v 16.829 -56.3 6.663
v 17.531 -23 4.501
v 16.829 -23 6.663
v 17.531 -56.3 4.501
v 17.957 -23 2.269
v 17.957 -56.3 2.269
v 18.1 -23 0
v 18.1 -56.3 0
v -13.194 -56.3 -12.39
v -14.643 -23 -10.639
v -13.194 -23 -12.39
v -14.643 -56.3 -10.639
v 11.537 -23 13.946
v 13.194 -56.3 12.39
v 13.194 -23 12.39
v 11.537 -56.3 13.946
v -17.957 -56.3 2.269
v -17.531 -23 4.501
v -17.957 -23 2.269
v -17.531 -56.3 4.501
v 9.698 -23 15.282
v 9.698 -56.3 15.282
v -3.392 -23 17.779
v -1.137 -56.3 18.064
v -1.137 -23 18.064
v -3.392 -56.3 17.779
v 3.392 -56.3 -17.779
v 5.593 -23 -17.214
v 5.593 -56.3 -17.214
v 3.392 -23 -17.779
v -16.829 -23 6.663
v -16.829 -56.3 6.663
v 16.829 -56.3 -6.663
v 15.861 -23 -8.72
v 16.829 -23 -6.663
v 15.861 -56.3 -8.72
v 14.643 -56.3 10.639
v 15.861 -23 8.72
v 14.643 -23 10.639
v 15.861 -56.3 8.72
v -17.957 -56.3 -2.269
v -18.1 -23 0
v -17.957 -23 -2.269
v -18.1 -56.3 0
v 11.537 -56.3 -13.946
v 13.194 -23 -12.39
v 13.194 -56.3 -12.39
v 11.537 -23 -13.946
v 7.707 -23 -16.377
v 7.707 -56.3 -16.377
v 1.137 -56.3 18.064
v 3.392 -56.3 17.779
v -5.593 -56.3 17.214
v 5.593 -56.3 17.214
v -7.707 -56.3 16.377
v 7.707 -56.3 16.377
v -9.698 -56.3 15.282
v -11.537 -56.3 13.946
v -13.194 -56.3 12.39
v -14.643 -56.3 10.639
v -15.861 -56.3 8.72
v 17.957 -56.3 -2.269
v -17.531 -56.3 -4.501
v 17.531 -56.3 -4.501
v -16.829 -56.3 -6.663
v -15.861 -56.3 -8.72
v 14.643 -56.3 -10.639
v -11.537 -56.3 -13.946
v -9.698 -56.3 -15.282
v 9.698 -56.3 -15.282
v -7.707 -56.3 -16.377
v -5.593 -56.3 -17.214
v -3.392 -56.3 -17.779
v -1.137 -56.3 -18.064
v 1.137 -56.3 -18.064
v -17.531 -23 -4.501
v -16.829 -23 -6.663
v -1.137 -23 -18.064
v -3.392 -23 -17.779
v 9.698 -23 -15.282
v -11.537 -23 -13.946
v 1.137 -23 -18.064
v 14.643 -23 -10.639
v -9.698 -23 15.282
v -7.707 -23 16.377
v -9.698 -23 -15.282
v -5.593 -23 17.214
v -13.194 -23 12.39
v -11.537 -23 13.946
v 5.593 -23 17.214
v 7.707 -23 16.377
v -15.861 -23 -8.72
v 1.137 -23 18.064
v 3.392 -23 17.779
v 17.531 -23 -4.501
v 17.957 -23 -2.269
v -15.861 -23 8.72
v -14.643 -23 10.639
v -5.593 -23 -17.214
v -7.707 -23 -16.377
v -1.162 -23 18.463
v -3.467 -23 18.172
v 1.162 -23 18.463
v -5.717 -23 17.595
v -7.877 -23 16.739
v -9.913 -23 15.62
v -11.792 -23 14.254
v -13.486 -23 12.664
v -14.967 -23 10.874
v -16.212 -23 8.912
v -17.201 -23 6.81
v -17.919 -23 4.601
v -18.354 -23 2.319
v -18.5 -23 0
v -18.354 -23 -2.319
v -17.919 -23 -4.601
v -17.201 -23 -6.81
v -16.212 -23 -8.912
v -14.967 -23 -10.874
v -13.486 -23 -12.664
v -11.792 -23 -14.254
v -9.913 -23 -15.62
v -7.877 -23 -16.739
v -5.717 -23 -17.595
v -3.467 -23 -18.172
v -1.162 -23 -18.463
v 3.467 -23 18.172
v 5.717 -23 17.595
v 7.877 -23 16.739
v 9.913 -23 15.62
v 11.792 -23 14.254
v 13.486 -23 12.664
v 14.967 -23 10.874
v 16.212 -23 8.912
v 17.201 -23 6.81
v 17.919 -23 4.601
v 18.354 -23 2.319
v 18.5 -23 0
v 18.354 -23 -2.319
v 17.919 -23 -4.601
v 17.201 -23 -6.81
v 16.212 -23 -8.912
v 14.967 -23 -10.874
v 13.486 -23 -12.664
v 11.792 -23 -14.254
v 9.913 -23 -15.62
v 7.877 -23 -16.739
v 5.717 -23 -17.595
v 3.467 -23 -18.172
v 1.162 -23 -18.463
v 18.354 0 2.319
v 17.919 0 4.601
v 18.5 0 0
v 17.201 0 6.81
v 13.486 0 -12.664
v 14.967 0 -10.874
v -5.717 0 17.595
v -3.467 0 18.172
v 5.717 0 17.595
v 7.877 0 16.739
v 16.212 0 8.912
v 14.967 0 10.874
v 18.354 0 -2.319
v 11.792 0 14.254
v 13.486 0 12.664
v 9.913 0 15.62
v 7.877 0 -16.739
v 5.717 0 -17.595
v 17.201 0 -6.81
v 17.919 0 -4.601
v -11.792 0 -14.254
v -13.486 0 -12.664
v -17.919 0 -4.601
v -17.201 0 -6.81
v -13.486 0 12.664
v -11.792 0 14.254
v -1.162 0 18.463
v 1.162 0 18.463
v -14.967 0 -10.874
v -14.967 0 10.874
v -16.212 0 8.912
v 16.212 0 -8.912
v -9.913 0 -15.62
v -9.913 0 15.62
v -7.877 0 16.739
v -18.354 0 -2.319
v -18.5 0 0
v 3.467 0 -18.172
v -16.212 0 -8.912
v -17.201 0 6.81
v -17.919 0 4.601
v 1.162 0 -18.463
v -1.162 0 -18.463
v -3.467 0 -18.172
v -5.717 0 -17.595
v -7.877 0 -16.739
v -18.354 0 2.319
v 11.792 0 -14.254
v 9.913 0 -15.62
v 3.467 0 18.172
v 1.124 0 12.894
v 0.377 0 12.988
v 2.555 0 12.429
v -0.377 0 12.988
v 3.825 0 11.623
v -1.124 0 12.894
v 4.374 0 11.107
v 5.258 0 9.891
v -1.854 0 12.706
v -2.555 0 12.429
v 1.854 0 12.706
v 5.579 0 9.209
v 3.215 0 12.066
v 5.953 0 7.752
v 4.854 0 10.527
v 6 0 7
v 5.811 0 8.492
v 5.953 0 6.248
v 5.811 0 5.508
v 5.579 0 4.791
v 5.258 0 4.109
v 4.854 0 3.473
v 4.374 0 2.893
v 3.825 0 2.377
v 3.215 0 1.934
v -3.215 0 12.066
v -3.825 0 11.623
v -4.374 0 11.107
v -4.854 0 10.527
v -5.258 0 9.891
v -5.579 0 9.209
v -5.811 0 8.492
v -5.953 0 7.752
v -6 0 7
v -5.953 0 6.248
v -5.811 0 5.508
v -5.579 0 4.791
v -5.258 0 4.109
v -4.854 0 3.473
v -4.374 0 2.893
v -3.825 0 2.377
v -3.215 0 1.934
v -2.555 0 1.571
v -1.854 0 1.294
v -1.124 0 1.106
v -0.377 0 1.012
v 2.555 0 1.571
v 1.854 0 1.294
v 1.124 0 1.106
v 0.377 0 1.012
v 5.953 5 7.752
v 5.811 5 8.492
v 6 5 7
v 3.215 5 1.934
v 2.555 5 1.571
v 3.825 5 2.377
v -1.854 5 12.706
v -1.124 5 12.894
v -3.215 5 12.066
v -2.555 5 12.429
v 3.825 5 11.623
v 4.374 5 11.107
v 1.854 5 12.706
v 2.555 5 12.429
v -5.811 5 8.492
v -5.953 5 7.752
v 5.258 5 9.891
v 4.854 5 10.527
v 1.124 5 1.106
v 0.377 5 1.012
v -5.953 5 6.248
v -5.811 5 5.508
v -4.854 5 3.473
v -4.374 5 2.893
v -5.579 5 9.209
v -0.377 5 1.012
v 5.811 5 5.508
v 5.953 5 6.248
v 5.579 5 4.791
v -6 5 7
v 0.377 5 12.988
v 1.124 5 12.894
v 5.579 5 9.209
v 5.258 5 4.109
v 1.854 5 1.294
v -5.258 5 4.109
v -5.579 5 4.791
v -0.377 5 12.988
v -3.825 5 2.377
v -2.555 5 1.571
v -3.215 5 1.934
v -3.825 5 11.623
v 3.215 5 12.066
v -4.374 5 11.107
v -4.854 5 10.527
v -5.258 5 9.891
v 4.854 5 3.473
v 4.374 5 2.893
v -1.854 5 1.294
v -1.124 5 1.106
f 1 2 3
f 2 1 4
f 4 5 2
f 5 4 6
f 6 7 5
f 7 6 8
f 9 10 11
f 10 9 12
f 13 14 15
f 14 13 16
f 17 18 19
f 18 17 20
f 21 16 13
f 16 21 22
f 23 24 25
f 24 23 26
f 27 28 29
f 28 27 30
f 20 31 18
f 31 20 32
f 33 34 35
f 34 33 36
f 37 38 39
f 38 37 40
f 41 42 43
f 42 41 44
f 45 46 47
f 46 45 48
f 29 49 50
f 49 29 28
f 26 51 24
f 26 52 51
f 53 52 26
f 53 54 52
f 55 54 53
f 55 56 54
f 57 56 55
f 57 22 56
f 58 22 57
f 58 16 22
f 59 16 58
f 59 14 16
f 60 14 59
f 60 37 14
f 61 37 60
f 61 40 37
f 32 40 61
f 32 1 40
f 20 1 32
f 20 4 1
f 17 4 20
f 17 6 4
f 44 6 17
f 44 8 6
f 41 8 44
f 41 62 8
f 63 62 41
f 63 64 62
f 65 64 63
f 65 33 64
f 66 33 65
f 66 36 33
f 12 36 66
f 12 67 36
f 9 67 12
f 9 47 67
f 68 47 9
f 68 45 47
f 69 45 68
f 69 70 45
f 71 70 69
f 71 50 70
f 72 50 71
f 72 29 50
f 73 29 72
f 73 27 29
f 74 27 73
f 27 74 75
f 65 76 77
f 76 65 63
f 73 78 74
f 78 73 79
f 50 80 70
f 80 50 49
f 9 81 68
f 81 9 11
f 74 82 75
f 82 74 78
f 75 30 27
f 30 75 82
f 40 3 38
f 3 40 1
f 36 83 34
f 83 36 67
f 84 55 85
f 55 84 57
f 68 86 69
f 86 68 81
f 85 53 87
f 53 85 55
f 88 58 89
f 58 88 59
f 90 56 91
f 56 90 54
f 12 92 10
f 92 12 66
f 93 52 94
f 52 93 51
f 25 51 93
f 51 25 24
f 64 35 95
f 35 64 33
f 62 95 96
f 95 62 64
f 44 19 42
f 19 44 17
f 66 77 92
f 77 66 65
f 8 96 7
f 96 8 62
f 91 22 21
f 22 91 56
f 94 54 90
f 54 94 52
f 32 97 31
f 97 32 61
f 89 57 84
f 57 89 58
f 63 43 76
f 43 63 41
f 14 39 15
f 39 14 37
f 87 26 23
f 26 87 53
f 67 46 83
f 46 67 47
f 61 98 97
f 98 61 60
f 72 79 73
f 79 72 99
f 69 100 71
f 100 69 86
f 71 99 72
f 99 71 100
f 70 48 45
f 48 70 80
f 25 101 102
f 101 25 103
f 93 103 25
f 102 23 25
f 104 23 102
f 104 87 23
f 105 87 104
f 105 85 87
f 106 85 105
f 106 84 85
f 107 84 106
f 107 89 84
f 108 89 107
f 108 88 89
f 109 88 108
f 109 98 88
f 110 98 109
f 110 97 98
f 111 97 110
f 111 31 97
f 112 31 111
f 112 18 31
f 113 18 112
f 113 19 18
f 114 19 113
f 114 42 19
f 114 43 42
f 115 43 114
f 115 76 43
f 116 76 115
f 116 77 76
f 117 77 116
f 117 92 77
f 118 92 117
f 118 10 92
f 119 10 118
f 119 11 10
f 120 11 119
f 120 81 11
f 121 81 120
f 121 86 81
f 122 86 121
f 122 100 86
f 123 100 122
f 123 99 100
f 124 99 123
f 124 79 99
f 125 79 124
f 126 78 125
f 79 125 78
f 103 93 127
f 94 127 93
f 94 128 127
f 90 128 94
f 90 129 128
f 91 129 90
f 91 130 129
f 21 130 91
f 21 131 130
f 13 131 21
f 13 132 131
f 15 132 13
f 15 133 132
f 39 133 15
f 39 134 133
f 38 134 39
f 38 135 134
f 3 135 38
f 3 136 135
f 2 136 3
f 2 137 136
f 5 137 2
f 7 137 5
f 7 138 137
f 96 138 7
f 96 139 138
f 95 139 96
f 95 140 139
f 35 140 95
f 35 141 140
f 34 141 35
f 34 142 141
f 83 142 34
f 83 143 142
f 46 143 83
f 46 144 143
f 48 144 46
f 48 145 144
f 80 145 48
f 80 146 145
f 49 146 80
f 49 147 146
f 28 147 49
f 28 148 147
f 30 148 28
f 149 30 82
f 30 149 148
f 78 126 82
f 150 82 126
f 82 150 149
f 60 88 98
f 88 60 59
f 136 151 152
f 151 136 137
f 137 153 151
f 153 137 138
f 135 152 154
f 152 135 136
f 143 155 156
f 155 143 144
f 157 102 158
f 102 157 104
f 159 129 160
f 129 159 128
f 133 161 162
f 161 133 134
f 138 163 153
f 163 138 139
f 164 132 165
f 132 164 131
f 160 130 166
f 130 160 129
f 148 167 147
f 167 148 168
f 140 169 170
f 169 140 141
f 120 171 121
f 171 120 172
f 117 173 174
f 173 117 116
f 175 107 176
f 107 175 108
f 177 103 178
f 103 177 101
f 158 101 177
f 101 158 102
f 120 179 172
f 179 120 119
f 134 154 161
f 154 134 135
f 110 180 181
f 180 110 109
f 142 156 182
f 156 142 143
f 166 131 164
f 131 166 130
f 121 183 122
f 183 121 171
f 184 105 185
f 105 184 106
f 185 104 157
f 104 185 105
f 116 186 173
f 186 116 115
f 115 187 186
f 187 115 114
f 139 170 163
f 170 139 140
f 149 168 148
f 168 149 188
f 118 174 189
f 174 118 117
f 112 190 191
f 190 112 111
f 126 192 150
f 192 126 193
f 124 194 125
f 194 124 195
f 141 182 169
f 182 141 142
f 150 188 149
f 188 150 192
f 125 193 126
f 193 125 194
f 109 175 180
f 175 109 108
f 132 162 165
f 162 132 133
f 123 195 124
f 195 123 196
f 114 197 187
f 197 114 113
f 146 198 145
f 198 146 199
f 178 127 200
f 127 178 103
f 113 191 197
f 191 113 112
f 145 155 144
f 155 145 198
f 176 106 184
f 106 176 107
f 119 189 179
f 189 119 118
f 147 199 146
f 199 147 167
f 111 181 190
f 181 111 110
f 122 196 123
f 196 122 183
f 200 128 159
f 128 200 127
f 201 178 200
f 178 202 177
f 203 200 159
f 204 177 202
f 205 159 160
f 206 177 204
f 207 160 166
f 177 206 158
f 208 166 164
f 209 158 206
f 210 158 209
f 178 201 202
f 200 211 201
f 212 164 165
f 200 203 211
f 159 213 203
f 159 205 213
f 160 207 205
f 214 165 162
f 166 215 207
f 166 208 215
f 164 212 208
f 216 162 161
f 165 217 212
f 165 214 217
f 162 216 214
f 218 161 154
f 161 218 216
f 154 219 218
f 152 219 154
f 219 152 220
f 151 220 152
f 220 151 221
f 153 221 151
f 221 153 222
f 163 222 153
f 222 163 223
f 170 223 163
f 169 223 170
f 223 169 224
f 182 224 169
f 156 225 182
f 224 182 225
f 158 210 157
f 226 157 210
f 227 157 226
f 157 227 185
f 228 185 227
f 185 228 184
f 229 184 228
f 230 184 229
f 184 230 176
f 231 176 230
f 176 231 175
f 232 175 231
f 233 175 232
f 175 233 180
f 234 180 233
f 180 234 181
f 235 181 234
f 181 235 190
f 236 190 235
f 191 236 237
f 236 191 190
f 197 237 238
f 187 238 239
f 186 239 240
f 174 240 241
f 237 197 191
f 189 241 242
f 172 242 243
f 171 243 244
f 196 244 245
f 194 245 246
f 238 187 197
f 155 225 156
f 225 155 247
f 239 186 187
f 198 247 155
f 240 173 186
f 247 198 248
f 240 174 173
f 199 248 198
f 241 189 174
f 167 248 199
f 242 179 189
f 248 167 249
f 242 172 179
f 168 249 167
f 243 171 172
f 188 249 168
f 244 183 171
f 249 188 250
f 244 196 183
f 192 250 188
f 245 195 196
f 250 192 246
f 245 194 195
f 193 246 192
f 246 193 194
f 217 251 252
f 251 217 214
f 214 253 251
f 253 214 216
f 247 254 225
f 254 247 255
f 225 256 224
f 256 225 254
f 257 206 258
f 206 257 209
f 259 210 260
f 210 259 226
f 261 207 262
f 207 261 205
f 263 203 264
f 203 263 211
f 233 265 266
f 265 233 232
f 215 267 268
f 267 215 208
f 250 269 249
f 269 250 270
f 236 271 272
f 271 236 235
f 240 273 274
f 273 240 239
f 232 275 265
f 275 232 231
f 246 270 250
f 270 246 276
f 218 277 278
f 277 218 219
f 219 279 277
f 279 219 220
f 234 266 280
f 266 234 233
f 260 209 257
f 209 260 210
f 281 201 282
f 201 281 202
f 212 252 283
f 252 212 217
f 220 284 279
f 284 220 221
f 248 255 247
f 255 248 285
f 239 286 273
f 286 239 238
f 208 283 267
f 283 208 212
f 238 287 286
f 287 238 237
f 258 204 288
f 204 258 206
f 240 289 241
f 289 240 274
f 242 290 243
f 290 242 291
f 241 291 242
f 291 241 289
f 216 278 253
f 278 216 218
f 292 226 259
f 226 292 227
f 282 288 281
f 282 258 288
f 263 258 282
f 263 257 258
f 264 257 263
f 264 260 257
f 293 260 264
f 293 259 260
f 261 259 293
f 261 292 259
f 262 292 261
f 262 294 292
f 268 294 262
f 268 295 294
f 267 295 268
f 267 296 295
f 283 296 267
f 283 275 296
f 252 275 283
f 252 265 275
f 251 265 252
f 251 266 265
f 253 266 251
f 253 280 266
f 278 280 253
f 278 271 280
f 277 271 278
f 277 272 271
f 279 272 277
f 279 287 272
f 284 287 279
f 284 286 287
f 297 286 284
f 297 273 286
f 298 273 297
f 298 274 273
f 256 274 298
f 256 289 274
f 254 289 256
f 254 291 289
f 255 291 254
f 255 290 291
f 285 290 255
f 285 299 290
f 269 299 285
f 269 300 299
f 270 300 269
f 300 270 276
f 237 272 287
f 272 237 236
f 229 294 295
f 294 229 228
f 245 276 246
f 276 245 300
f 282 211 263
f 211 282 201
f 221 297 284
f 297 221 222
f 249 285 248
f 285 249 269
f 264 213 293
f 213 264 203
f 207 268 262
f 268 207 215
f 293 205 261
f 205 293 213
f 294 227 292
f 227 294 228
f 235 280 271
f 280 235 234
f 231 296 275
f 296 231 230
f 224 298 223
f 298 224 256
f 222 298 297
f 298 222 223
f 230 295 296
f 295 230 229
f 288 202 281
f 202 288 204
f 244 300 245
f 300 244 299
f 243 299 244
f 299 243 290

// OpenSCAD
// copyright: GNU @kuberlog
// https://www.amazon.com/gp/product/B0745YDSJS

$fn = 50;

gearbox_d = 37;
gearbox_y = 23;
gearbox_delta_y = -gearbox_y/2;

motor_d = 36.2;
motor_y = 33.3;
motor_delta_y = -motor_y/2 - gearbox_y;

shaft_d = 6;
shaft_y = 14;
shaft_delta_z = 7;

shaftNub_d = 12;
shaftNub_y = 5;
shaftNub_delta_y = shaftNub_y/2;
shaftNub_delta_z = shaft_delta_z;



module motor() {
  color([0.4,0.4,0.4]) {
    translate([0, motor_delta_y, 0]) {
      rotate([90,0,0]) cylinder(d=motor_d, h=motor_y,  center=true);
    }
  }
}

module gearbox() {
  color([0.3,0.3,0.3]) {
    translate([0, gearbox_delta_y, 0]) {
      rotate([90,0,0]) cylinder(d=gearbox_d, h=gearbox_y,  center=true);
    }
  }
}

module shaftNub() {
  color([0.6,0.6,0.6]) {
    translate([0, shaftNub_delta_y, shaftNub_delta_z]) {
      rotate([90,0,0]) cylinder(d=shaftNub_d, h=shaftNub_y,  center=true);
    }
  }
}

module GearMotor1000RPM() {
  motor();
  gearbox();
  shaftNub();
}

GearMotor1000RPM();
